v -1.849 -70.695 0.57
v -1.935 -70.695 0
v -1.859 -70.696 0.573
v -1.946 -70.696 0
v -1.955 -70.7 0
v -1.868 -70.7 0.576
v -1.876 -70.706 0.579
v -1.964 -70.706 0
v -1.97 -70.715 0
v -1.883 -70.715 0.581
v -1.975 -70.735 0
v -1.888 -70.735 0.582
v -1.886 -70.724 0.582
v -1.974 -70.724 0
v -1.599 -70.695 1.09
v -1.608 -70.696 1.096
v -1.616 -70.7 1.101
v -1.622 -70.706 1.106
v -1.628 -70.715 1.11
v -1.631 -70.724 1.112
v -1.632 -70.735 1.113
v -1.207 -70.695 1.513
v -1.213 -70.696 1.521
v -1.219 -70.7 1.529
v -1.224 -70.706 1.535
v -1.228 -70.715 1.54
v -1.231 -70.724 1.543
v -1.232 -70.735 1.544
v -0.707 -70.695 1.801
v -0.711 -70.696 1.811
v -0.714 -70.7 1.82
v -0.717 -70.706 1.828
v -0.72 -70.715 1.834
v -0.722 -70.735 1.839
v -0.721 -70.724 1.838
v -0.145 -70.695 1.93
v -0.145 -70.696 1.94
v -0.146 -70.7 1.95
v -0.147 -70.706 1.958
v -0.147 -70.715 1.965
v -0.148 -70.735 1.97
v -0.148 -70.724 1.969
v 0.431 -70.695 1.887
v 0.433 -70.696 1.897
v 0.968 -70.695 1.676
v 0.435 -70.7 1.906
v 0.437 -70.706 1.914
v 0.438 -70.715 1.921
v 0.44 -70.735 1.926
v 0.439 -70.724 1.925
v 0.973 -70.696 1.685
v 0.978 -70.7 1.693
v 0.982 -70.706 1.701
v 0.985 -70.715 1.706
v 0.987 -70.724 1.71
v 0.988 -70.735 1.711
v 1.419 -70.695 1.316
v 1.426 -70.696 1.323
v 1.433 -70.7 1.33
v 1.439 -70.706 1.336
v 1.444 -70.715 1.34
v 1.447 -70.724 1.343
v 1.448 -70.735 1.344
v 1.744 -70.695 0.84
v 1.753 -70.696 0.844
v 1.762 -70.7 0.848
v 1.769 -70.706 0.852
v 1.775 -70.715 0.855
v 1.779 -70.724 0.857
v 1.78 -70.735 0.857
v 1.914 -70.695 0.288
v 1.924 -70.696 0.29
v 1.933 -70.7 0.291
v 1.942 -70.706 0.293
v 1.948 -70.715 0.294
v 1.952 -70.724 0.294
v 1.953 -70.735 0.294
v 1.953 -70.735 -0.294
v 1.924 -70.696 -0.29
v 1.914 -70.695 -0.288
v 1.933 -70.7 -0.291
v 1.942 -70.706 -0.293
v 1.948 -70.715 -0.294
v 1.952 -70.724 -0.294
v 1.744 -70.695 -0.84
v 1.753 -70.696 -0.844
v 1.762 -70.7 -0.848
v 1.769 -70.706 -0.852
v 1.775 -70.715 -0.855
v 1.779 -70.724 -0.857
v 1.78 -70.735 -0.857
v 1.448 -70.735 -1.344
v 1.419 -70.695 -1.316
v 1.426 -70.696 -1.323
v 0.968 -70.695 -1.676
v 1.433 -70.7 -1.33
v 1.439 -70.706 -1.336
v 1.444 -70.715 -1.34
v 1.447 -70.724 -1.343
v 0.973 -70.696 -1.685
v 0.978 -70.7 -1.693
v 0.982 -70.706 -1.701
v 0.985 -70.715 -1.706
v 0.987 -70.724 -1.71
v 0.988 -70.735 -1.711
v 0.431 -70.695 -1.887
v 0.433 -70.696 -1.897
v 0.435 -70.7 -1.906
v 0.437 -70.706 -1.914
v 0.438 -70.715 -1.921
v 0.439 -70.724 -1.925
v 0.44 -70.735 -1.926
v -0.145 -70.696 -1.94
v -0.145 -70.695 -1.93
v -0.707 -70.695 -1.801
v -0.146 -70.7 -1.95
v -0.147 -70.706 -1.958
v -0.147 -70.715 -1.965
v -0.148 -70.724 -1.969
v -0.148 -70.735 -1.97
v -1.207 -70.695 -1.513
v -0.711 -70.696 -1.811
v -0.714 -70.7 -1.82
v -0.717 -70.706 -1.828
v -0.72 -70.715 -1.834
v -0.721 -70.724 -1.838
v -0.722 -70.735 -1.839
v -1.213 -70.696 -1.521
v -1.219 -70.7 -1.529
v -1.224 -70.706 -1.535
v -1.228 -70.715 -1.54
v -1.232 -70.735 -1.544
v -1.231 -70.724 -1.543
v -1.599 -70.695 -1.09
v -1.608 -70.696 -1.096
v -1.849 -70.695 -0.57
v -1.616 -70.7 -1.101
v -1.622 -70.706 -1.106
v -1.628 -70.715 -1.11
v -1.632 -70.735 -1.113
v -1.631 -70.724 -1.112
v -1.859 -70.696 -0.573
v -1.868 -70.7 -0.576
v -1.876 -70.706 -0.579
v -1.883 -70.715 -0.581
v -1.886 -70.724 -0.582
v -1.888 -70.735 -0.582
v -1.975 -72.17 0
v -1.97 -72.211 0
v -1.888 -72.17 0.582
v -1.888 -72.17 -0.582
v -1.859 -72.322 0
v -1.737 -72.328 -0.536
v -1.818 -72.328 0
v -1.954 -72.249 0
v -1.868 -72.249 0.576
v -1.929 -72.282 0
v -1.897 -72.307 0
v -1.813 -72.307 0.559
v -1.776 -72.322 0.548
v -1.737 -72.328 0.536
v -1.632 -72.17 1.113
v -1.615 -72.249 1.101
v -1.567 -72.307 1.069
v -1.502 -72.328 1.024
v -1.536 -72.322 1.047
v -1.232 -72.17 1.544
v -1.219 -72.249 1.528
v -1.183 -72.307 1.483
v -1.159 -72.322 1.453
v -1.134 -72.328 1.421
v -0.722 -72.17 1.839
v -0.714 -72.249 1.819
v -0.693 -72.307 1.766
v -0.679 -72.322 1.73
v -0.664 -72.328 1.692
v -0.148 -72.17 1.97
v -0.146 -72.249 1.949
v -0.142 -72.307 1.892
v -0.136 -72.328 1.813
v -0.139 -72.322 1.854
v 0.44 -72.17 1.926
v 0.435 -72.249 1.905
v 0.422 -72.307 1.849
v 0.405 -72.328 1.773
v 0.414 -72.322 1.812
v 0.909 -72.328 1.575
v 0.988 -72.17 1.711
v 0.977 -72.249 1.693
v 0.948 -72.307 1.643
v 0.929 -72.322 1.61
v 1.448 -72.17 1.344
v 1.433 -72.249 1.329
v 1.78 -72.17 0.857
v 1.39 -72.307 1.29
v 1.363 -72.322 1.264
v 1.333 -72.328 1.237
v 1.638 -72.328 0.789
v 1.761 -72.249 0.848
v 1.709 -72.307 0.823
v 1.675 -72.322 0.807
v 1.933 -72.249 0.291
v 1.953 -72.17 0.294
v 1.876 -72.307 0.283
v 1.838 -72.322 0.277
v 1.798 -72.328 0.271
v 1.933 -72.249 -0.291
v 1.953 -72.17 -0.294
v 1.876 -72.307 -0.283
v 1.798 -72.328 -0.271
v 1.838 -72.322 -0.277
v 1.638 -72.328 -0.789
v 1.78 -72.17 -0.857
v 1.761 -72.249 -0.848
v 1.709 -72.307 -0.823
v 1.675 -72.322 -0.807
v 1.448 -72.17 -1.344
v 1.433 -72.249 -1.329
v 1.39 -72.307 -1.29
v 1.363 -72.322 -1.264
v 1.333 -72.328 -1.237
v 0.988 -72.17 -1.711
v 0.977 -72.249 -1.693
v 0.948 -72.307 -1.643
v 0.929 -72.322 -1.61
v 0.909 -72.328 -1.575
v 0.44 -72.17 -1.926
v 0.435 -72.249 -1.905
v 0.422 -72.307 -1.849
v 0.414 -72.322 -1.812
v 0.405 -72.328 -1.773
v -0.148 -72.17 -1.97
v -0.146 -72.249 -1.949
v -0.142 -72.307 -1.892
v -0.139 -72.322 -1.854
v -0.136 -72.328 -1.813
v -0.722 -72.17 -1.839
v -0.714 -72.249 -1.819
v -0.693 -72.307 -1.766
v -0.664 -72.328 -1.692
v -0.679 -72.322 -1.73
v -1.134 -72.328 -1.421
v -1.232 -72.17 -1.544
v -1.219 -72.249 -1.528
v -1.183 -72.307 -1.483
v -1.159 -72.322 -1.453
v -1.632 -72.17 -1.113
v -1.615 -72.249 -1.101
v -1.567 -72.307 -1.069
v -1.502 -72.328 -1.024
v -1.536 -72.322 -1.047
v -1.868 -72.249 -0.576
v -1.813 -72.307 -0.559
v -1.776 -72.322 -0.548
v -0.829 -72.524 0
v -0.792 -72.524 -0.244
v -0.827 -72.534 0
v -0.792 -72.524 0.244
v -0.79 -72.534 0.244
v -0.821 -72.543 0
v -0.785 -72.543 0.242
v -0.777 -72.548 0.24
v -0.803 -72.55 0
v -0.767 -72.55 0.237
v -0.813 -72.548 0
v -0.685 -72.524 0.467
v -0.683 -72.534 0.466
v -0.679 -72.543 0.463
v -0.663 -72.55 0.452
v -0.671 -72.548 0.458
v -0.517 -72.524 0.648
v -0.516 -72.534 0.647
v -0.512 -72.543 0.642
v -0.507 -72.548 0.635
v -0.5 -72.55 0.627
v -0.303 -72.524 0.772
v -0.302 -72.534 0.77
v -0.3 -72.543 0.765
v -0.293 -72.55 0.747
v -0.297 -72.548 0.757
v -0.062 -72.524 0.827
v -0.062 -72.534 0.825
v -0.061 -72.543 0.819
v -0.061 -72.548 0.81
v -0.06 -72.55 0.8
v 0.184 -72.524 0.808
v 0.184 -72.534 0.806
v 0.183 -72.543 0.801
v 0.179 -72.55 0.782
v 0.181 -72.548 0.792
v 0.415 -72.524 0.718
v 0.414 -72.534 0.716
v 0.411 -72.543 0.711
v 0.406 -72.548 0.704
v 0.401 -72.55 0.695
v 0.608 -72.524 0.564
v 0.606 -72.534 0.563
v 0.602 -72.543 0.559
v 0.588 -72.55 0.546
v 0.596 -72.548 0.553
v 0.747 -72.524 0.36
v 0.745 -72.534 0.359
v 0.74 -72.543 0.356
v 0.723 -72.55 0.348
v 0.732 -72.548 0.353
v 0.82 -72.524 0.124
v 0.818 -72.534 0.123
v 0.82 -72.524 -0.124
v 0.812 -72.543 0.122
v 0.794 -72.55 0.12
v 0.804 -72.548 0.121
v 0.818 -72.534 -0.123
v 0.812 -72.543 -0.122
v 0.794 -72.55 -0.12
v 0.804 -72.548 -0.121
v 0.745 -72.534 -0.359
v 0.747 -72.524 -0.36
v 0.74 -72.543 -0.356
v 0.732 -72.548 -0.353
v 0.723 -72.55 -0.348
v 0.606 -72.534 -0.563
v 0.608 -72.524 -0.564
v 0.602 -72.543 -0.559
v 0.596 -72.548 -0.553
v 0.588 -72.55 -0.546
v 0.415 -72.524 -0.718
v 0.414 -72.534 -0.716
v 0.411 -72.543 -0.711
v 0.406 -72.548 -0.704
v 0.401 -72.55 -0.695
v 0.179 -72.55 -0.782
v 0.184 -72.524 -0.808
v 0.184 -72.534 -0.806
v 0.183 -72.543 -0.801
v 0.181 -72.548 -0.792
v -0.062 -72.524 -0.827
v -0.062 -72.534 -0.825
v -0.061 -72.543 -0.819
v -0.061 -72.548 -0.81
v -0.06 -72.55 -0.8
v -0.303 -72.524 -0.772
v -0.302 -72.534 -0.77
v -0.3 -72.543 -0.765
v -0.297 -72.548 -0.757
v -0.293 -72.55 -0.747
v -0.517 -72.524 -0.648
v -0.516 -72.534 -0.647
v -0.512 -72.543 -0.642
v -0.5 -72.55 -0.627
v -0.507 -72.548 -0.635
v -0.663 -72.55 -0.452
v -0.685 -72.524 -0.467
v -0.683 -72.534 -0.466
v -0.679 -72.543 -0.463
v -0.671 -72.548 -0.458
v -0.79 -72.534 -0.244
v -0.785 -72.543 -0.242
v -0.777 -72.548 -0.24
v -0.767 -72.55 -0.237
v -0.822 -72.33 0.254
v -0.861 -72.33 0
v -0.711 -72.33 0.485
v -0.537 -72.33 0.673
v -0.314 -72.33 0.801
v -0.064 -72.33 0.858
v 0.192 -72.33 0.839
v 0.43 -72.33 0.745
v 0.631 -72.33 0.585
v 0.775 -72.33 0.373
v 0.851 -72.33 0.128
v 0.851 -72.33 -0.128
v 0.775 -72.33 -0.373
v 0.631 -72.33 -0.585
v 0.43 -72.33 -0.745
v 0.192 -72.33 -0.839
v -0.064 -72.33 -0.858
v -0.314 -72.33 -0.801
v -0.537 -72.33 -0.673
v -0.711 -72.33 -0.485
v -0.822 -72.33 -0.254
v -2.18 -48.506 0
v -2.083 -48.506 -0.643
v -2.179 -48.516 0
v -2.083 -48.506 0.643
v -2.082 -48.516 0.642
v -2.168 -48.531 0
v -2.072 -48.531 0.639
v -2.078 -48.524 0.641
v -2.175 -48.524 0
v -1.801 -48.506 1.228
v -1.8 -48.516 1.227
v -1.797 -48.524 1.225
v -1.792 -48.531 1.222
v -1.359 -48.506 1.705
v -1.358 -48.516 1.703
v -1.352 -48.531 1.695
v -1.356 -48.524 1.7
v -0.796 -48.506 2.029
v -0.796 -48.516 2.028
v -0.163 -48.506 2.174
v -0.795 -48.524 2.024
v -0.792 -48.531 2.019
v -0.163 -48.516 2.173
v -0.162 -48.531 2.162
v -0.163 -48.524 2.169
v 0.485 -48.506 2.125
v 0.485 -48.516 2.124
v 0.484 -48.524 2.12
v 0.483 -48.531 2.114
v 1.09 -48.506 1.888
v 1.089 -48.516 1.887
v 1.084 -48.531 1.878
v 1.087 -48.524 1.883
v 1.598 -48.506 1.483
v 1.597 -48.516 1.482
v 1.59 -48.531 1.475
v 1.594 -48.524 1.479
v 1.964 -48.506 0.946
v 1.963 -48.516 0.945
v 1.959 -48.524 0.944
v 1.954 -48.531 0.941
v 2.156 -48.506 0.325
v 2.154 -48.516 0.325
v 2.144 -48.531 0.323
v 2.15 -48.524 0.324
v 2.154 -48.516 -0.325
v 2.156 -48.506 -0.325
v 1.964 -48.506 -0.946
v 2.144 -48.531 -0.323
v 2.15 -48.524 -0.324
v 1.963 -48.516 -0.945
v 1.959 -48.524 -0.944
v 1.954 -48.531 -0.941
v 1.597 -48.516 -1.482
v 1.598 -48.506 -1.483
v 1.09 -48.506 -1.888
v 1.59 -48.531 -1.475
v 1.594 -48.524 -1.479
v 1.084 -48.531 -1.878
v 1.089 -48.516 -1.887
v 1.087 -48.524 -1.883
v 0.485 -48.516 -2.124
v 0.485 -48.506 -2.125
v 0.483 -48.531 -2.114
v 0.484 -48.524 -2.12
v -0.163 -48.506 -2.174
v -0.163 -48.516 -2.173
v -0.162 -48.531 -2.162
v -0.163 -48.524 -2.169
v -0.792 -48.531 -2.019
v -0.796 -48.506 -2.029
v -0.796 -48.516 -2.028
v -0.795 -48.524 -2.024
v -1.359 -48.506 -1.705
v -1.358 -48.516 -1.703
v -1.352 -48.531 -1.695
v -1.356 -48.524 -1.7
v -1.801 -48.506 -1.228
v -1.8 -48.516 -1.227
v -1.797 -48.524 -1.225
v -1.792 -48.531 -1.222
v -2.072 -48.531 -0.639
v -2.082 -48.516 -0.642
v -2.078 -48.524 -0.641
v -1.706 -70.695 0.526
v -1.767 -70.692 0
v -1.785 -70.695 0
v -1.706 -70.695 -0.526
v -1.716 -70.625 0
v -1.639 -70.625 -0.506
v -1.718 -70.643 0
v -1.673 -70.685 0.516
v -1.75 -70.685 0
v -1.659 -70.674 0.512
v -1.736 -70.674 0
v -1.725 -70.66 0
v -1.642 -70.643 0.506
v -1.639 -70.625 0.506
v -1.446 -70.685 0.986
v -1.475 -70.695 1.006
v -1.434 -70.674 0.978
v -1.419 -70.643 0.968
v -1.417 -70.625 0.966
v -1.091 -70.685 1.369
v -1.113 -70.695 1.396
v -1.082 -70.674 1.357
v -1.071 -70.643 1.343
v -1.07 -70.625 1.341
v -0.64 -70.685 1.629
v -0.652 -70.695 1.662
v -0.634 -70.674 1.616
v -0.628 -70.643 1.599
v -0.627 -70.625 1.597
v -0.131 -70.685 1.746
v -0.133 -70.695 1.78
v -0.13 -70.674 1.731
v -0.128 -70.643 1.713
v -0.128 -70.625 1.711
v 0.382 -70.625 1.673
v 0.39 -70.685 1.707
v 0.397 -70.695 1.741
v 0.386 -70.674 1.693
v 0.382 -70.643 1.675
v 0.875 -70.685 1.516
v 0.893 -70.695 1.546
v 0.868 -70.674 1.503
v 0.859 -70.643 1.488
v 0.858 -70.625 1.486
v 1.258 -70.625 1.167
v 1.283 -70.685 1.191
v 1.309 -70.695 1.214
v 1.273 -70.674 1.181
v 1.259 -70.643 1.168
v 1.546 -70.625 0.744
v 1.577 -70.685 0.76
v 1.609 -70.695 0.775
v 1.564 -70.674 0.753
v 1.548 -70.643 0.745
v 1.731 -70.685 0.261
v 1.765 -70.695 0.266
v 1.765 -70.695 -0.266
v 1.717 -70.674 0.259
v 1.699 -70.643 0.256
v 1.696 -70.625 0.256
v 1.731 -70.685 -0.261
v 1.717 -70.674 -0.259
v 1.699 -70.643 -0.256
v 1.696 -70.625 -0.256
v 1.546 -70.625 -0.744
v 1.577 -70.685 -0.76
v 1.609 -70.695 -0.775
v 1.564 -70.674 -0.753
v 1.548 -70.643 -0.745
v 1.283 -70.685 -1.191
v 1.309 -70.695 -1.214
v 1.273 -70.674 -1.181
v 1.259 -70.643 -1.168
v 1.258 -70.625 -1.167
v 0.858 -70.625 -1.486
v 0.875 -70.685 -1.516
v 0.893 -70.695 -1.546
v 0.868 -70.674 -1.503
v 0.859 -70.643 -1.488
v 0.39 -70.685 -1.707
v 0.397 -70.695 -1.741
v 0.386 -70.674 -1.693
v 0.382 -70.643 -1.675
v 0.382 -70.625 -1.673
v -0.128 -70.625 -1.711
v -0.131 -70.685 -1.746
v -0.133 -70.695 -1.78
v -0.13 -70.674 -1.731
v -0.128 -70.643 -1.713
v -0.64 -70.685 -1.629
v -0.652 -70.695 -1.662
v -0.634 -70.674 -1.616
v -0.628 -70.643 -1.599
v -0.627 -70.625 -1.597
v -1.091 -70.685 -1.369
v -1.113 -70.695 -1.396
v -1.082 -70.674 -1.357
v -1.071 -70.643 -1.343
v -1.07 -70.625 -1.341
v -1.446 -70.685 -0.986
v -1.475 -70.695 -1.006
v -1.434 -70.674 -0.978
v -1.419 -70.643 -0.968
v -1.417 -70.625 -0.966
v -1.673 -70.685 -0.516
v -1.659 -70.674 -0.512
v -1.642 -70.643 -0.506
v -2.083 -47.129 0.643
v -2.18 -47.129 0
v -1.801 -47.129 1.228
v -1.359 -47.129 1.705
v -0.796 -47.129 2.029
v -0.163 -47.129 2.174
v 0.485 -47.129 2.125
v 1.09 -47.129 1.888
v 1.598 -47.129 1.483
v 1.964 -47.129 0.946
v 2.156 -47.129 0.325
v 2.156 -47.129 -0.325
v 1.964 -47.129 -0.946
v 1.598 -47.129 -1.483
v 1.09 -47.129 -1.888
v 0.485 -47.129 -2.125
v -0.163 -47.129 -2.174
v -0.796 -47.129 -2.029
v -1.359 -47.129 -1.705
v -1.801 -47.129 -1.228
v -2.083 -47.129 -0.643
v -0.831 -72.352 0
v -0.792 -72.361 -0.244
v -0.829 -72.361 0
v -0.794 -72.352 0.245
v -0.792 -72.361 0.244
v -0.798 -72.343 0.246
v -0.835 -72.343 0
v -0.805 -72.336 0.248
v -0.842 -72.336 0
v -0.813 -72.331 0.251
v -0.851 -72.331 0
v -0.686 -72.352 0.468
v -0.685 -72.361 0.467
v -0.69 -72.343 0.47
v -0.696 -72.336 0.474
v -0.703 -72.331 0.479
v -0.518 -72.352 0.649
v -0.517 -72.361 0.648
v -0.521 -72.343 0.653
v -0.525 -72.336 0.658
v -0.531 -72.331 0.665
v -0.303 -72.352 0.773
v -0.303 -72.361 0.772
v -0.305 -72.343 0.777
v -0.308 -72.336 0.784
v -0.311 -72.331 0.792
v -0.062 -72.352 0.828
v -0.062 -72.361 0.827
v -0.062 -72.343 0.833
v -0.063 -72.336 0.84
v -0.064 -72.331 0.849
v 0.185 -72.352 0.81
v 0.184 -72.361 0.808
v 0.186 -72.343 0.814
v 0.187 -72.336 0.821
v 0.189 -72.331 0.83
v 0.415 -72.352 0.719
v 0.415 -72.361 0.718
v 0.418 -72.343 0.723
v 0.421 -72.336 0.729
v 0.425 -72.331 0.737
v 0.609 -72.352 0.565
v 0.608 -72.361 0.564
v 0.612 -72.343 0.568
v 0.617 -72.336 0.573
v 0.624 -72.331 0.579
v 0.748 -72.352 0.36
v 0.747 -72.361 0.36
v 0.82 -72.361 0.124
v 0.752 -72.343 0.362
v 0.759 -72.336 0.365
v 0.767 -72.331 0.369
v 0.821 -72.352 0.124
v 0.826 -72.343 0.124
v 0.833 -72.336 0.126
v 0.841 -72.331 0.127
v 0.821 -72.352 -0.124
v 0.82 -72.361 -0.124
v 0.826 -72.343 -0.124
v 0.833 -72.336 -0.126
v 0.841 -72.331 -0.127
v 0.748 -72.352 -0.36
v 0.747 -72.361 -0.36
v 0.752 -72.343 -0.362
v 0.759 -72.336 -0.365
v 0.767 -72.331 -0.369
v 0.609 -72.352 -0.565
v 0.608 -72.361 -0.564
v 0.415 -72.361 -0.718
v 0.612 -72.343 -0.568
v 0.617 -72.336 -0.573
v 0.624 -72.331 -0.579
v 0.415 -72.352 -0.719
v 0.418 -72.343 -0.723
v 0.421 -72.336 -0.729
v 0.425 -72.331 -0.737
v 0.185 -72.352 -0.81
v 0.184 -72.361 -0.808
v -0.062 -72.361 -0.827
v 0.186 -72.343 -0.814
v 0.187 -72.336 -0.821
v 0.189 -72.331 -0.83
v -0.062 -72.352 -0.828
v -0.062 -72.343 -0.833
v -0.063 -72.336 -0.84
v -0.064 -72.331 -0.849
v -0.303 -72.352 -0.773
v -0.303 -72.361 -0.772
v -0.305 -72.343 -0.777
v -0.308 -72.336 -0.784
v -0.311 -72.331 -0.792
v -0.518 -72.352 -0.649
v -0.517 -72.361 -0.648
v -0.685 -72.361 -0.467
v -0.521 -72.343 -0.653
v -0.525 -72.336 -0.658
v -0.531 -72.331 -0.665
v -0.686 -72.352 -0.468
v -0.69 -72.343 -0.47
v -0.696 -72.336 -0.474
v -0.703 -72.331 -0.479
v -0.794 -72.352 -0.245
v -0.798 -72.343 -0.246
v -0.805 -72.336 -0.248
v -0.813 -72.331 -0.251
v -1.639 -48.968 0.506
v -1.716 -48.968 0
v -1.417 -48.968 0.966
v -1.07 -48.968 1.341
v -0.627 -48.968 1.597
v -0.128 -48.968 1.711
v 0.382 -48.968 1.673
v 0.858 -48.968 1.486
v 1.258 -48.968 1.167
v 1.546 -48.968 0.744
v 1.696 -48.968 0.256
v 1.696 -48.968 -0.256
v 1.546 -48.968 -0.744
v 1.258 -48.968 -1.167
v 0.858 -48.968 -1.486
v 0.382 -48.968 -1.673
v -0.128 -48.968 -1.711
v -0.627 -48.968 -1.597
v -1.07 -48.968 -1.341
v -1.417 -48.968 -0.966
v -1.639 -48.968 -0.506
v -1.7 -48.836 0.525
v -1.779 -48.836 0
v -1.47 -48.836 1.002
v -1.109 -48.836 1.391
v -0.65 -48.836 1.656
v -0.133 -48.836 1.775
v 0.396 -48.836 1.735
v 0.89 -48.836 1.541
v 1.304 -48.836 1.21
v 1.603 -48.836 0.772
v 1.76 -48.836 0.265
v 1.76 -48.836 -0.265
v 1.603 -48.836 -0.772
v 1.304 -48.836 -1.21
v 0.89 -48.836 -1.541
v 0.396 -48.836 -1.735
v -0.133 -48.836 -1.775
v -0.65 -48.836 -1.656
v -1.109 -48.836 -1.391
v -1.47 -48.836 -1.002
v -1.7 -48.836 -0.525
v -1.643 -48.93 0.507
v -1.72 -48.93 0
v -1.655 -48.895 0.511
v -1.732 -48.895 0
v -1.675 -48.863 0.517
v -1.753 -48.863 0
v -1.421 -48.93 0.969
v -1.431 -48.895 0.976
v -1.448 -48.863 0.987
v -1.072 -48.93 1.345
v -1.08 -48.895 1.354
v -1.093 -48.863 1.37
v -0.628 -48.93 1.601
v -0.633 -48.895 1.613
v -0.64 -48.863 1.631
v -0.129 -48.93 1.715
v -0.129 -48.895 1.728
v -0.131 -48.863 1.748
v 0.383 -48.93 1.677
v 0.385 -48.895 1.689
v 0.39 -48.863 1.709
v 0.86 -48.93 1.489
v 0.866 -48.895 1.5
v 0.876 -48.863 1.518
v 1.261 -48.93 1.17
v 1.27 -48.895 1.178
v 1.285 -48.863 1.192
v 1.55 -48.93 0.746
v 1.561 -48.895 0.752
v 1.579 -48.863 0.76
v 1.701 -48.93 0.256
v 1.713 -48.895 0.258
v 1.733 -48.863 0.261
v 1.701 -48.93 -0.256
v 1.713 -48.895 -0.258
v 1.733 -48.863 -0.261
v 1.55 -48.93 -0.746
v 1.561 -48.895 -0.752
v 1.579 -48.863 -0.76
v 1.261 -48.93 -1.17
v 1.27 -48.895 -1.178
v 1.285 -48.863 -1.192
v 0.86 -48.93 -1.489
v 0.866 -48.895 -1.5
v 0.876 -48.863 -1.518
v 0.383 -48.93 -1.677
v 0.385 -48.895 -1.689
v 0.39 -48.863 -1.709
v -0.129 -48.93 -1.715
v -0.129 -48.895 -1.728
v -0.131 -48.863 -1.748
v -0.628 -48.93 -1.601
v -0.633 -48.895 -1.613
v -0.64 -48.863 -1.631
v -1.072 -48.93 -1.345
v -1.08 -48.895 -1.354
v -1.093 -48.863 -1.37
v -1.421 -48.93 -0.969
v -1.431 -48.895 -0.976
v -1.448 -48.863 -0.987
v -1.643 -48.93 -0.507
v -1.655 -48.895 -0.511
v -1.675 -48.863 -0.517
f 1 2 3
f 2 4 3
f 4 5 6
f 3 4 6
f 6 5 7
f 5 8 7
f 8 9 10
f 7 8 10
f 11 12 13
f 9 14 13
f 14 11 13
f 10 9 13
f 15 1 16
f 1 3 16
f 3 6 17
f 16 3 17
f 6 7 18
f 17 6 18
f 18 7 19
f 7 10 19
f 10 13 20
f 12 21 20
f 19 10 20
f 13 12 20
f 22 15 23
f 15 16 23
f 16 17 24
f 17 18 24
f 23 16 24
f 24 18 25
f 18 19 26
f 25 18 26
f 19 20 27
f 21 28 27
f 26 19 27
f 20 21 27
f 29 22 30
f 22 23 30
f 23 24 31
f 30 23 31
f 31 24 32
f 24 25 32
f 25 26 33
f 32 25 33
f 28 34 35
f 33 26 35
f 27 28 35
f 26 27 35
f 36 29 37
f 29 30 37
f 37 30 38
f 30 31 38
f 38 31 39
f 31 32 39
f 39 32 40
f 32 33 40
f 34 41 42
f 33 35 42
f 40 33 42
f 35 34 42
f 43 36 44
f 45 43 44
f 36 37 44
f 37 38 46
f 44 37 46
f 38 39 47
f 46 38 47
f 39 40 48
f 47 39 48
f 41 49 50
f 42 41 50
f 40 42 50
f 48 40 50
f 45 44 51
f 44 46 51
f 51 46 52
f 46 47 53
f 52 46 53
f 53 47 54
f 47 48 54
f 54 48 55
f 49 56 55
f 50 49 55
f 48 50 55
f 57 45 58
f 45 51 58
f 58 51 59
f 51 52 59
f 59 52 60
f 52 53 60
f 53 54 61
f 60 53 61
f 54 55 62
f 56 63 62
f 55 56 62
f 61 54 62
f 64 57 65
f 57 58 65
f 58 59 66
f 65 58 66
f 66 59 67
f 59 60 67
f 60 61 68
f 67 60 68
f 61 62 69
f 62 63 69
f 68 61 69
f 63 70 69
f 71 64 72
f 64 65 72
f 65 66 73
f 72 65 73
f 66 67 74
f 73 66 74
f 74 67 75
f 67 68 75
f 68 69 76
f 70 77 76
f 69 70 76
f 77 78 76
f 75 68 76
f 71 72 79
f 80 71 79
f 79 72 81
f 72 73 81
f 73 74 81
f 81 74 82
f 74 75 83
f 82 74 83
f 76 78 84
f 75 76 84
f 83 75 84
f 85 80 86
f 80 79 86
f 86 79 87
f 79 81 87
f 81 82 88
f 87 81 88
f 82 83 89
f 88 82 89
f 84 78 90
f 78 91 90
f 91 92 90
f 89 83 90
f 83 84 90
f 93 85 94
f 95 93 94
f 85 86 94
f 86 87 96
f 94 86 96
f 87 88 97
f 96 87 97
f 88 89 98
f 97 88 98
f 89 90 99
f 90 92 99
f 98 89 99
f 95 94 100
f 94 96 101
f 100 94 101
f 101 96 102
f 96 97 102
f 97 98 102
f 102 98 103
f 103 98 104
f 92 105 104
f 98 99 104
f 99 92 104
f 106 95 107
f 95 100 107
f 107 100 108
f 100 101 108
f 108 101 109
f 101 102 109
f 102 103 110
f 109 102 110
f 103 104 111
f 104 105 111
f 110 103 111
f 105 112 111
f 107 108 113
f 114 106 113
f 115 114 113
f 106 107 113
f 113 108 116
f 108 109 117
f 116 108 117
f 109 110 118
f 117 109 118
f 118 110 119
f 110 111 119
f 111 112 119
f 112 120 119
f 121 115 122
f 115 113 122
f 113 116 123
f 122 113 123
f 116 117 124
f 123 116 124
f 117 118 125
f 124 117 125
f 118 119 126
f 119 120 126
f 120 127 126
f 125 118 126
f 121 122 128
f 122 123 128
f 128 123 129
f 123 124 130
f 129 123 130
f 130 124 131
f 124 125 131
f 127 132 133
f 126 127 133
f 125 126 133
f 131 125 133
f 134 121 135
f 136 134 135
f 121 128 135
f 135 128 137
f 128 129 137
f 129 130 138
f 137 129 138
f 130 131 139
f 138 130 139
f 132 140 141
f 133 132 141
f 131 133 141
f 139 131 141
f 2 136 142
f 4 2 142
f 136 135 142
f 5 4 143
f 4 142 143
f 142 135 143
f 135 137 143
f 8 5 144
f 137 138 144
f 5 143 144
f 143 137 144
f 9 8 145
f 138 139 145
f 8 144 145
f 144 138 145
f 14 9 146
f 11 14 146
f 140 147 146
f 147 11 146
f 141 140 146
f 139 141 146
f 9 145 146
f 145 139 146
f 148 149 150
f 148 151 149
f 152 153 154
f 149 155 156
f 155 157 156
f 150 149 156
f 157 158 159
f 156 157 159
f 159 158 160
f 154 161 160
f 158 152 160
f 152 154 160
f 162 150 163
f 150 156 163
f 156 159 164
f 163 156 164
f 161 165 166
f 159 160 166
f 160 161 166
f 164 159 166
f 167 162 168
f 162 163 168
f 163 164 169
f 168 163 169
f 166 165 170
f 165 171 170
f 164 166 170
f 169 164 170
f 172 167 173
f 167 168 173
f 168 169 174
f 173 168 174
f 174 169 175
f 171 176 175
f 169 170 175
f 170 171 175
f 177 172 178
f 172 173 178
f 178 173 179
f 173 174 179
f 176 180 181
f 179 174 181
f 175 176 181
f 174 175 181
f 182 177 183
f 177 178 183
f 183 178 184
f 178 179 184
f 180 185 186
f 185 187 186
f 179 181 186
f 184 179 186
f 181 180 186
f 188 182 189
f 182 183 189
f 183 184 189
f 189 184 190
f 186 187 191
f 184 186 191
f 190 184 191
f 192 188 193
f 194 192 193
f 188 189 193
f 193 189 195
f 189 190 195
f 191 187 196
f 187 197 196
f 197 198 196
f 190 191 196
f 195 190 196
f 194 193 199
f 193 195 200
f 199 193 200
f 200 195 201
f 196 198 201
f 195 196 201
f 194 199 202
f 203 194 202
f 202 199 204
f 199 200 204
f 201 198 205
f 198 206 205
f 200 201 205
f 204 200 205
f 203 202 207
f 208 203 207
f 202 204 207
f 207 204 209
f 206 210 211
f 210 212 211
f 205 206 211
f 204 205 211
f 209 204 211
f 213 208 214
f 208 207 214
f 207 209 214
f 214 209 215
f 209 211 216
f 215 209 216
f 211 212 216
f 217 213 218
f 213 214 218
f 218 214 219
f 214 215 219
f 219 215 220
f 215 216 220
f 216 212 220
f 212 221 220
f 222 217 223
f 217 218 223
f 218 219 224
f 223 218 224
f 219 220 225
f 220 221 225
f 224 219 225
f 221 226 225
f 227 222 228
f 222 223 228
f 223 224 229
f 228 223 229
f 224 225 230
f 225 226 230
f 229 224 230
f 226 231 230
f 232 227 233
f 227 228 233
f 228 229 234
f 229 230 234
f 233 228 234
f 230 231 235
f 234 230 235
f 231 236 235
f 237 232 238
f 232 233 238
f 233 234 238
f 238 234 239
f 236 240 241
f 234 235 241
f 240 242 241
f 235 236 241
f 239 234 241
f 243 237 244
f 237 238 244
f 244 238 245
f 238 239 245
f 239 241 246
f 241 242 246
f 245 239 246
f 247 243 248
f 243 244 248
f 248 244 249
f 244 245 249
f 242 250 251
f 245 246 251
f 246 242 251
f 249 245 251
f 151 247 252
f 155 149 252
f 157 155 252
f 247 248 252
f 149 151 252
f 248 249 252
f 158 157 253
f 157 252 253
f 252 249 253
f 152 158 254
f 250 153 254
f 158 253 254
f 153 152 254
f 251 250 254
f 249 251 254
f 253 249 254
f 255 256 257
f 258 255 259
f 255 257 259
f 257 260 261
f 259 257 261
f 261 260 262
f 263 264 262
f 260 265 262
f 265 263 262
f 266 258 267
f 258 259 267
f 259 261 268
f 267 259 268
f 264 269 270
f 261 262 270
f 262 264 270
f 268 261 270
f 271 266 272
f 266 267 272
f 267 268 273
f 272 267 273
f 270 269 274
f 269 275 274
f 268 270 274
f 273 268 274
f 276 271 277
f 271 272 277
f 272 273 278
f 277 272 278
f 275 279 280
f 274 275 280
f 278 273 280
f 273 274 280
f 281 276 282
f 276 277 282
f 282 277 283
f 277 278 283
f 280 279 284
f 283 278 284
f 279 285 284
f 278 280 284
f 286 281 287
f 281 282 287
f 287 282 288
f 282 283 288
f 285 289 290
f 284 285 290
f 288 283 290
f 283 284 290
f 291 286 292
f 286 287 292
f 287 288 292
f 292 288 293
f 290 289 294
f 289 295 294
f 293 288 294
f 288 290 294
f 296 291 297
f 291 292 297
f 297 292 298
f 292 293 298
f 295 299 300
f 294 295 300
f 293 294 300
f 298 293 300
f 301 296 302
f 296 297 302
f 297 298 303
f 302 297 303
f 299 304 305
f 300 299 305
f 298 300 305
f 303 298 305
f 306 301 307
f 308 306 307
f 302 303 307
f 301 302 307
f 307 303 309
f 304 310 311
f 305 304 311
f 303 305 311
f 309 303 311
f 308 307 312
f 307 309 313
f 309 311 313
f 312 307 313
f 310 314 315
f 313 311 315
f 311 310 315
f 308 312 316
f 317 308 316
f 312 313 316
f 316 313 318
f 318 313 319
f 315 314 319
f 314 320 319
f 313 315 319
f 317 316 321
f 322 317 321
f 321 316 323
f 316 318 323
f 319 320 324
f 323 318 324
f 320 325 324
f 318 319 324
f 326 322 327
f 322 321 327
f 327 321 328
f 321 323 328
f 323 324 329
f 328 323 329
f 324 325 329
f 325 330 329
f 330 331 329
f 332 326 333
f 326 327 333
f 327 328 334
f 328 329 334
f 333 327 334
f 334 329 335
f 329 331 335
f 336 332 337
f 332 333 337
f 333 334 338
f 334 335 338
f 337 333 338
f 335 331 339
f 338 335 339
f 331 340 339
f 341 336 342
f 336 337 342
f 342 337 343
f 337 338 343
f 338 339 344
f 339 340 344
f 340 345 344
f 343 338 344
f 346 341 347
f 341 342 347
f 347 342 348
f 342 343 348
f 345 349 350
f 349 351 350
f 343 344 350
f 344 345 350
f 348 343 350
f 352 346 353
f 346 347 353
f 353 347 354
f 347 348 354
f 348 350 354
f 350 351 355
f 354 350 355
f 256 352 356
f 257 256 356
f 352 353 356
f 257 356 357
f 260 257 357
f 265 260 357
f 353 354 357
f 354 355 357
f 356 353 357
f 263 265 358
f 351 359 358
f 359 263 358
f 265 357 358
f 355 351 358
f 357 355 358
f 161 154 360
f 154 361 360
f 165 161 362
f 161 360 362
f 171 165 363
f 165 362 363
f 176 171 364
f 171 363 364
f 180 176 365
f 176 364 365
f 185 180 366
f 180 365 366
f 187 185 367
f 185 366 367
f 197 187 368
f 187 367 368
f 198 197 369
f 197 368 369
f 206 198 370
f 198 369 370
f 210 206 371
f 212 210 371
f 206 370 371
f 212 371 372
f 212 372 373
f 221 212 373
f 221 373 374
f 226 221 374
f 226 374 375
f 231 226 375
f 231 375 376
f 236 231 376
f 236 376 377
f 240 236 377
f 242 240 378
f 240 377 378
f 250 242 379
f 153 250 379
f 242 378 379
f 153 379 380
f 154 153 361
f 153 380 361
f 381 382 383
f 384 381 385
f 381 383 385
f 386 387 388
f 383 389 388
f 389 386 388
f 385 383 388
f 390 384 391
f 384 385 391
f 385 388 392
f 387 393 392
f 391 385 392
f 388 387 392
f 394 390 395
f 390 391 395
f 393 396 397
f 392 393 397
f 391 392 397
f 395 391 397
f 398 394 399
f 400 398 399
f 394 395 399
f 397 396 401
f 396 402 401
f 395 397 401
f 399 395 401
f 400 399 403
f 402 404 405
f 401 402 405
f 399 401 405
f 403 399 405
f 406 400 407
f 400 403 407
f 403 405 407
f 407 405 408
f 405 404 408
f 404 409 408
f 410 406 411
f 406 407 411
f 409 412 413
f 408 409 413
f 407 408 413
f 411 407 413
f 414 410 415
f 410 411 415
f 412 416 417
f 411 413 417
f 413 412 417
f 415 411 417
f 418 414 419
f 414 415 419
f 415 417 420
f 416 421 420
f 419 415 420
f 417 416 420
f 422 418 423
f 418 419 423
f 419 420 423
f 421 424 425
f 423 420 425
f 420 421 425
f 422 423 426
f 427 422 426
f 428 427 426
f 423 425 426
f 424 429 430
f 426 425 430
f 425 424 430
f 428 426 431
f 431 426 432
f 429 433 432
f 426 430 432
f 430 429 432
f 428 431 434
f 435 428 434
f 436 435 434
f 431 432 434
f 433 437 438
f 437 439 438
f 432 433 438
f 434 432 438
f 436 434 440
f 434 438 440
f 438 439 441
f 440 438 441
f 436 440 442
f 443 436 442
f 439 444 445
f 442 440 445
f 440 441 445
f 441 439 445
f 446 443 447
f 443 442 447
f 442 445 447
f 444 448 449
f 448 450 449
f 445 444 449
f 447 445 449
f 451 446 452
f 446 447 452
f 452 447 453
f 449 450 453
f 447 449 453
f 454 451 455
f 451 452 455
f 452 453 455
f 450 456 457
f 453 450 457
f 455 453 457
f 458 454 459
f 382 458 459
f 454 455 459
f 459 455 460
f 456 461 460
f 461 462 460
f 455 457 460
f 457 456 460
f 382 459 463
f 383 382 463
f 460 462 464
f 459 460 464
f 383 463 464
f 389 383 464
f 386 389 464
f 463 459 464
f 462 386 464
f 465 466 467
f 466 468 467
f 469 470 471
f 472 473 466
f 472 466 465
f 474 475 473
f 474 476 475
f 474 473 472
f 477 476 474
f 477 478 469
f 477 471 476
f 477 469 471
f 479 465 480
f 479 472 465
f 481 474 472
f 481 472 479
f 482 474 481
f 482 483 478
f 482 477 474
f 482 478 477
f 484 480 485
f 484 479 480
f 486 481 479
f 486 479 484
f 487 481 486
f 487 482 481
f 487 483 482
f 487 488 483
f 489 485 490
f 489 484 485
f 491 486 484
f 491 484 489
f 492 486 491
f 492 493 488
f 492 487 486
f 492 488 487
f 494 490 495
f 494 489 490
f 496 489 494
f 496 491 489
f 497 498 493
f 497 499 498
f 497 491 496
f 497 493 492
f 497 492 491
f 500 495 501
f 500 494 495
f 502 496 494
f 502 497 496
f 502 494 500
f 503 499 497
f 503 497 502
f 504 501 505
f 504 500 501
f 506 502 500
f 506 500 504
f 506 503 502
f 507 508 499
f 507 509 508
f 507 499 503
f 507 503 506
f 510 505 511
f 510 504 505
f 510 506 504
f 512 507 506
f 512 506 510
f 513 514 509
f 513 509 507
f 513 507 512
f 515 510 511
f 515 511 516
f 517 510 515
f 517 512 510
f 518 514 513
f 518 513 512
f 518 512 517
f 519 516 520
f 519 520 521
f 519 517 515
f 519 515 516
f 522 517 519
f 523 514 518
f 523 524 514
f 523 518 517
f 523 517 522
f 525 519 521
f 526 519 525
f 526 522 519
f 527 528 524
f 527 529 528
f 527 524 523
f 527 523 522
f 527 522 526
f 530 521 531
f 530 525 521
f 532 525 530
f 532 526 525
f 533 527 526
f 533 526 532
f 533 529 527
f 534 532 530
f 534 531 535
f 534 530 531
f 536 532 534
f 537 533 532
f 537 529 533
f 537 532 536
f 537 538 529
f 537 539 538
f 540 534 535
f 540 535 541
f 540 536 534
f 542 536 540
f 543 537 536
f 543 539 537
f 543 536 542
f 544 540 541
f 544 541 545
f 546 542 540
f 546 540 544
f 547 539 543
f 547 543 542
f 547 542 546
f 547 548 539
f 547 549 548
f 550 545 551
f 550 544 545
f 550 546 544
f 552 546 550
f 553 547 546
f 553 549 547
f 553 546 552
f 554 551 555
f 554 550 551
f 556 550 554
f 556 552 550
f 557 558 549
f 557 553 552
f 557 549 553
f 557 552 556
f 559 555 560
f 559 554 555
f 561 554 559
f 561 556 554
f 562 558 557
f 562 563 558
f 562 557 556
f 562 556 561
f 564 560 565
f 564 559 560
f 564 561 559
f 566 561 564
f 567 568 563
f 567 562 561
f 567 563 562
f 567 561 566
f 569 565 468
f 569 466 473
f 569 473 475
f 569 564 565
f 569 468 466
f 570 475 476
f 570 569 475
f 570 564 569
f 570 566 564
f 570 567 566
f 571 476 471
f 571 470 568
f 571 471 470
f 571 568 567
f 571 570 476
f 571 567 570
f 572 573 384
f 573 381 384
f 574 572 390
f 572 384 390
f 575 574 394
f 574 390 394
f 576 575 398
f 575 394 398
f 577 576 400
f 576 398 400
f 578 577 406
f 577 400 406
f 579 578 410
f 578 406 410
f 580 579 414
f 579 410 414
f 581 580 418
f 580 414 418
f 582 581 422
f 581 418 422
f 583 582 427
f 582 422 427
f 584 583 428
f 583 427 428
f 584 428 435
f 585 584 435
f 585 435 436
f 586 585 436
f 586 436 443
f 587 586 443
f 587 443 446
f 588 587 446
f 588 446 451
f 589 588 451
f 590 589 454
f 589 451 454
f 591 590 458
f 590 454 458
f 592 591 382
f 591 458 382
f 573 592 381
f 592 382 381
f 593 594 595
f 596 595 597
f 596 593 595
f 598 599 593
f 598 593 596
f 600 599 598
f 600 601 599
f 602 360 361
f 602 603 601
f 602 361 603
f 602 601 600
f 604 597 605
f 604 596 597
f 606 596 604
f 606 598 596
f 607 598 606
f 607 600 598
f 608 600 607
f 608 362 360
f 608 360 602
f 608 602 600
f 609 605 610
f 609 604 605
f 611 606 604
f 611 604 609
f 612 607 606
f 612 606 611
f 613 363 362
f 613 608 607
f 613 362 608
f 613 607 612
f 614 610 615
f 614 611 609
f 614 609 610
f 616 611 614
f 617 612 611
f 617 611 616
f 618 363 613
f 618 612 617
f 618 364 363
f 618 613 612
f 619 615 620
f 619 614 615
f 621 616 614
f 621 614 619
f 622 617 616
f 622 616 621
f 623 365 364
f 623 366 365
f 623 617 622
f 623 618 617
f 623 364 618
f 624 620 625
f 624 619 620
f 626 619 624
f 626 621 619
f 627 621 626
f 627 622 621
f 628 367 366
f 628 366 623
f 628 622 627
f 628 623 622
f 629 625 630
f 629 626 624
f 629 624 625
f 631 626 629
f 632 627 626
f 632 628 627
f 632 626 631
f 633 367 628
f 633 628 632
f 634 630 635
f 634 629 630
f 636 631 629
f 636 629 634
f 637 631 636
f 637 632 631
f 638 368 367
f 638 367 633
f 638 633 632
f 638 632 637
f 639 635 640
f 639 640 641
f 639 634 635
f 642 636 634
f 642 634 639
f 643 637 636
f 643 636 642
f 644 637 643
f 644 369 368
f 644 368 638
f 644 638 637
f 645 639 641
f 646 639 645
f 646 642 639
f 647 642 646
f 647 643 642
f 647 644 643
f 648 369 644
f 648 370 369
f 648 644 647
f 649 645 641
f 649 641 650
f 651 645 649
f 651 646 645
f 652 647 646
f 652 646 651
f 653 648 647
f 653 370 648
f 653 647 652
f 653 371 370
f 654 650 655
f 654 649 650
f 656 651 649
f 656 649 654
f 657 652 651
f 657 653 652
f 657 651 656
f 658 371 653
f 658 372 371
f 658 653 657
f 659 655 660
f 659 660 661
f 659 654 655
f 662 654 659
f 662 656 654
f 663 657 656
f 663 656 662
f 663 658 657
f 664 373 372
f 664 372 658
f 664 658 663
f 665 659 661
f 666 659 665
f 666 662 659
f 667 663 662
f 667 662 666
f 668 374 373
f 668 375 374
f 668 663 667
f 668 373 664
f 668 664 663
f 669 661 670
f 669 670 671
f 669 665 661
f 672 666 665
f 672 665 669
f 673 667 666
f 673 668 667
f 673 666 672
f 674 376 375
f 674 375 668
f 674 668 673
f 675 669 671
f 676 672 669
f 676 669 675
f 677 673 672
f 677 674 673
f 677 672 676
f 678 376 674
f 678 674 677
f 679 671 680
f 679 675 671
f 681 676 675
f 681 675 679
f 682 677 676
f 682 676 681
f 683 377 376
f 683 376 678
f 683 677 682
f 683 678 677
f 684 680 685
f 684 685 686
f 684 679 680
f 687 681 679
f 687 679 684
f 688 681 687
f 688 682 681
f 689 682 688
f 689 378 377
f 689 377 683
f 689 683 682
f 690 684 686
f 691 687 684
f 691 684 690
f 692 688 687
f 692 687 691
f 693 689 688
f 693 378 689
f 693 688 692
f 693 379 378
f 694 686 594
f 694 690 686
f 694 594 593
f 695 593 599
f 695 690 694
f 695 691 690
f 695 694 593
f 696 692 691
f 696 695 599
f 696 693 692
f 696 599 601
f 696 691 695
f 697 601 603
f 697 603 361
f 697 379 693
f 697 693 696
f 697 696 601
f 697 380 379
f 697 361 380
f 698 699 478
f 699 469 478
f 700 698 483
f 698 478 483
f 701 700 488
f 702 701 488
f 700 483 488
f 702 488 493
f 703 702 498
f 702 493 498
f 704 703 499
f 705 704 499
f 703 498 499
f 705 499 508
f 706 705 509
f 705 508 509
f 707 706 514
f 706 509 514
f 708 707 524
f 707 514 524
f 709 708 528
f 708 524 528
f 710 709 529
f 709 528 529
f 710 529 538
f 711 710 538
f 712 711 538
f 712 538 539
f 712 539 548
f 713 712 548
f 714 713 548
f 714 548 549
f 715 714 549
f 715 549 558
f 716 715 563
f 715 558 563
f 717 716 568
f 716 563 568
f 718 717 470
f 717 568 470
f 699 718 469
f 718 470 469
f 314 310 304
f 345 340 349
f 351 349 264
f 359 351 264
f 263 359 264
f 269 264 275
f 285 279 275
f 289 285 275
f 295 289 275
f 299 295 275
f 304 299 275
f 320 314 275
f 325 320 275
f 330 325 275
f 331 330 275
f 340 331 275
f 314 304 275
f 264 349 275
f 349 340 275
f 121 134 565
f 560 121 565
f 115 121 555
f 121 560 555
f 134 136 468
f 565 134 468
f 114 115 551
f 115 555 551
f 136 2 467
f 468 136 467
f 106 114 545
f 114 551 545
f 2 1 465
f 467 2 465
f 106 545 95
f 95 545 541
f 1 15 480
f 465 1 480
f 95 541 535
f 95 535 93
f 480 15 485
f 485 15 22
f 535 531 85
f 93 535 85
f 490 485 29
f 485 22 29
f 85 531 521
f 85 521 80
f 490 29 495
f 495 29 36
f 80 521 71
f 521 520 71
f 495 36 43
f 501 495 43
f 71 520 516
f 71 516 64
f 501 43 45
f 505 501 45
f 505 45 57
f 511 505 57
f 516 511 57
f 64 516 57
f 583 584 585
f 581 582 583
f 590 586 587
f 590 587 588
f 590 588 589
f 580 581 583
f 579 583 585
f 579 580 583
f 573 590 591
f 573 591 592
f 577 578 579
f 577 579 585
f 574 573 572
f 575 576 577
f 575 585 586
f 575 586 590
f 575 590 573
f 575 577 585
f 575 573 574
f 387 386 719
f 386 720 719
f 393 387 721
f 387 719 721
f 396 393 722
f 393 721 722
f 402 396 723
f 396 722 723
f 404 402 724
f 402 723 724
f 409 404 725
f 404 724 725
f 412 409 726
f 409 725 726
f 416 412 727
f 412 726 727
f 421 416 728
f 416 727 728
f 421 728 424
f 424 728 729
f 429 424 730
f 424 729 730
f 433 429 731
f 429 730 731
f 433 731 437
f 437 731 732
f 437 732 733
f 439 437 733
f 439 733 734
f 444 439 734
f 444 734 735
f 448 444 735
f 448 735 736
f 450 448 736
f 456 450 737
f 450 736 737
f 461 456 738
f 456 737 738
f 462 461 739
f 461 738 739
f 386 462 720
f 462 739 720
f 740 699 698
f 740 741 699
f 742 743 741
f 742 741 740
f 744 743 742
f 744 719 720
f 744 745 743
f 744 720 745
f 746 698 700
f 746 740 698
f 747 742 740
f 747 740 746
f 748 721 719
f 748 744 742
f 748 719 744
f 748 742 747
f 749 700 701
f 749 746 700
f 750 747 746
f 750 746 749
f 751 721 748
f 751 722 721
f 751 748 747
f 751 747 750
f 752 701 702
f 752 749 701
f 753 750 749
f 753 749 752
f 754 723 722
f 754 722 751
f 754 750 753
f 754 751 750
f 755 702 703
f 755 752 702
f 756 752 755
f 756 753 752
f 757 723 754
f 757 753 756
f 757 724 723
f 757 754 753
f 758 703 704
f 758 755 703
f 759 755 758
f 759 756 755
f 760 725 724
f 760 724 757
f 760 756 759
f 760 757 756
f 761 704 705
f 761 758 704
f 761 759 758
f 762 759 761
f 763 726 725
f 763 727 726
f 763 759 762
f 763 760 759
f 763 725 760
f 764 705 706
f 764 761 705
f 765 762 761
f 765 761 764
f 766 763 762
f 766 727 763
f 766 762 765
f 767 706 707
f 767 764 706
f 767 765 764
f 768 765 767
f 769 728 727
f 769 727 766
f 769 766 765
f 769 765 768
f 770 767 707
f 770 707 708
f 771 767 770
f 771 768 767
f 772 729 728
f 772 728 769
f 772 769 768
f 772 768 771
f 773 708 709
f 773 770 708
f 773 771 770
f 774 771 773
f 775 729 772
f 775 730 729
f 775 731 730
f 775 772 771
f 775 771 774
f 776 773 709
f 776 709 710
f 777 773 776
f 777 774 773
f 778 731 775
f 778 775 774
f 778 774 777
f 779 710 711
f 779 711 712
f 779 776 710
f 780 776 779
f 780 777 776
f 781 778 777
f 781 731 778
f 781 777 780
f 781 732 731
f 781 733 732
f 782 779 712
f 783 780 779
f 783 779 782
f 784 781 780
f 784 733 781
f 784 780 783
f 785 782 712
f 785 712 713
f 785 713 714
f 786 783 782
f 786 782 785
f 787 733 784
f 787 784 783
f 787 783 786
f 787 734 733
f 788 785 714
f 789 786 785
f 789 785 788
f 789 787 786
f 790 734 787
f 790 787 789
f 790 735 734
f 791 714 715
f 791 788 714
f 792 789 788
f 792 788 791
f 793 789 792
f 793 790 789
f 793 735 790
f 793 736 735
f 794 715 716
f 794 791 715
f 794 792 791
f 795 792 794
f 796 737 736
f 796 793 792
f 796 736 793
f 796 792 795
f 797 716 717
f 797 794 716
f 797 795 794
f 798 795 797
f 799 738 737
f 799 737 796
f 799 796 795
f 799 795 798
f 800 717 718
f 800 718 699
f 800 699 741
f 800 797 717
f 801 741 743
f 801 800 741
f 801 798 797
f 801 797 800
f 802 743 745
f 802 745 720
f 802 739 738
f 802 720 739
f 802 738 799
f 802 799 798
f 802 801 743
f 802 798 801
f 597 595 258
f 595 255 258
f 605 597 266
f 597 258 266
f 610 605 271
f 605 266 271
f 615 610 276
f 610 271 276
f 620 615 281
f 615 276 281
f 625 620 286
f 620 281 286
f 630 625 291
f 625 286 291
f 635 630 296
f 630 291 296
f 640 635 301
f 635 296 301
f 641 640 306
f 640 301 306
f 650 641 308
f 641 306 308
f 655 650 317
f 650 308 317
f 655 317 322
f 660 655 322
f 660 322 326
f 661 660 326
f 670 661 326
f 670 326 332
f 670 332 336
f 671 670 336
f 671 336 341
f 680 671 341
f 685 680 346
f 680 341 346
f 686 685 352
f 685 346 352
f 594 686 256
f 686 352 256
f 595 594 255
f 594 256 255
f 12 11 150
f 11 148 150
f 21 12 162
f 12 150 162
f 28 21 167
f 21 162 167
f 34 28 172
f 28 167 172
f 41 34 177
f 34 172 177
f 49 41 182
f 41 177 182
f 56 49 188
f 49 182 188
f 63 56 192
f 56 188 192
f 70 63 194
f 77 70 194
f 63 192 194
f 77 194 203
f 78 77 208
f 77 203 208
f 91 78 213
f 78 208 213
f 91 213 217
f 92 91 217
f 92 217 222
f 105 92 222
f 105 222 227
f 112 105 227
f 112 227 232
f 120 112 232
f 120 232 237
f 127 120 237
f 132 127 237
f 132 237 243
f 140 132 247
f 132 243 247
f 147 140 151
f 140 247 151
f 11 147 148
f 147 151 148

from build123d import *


with BuildPart() as part:
    # Sketch → Revolution (revolve)
    with BuildSketch(Plane.XY):
        with BuildLine():
            Line((-2.180142, -47.129375), (-2.180142, -48.50645))
            ThreePointArc((-2.180142, -48.50645), (-2.177063, -48.519832), (-2.168446, -48.530521))
            Line((-2.168446, -48.530521), (-1.779484, -48.836251))
            ThreePointArc((-1.715563, -48.967796), (-1.732389, -48.894669), (-1.779484, -48.836251))
            Line((-1.715563, -48.967796), (-1.715563, -70.624664))
            ThreePointArc((-1.785431, -70.694532), (-1.736027, -70.674068), (-1.715563, -70.624664))
            Line((-1.785431, -70.694532), (-1.935173, -70.694532))
            ThreePointArc((-1.935173, -70.694532), (-1.963666, -70.706334), (-1.975468, -70.734827))
            Line((-1.975468, -70.734827), (-1.975468, -72.170168))
            ThreePointArc((-1.975468, -72.170168), (-1.9294, -72.281531), (-1.818123, -72.327805))
            Line((-1.818123, -72.327805), (-0.86072, -72.329576))
            ThreePointArc((-0.829025, -72.361329), (-0.838305, -72.338897), (-0.86072, -72.329576))
            Line((-0.829025, -72.361329), (-0.829025, -72.523831))
            ThreePointArc((-0.829025, -72.523831), (-0.821279, -72.542532), (-0.802578, -72.550278))
            Line((-0.802578, -72.550278), (0, -72.550278))
            Line((0, -72.550278), (0, -47.129375))
            Line((-2.180142, -47.129375), (0, -47.129375))
        make_face()
    revolve(axis=Axis((0, 0, 0), (0, 1, 0)))


solid = part.part
